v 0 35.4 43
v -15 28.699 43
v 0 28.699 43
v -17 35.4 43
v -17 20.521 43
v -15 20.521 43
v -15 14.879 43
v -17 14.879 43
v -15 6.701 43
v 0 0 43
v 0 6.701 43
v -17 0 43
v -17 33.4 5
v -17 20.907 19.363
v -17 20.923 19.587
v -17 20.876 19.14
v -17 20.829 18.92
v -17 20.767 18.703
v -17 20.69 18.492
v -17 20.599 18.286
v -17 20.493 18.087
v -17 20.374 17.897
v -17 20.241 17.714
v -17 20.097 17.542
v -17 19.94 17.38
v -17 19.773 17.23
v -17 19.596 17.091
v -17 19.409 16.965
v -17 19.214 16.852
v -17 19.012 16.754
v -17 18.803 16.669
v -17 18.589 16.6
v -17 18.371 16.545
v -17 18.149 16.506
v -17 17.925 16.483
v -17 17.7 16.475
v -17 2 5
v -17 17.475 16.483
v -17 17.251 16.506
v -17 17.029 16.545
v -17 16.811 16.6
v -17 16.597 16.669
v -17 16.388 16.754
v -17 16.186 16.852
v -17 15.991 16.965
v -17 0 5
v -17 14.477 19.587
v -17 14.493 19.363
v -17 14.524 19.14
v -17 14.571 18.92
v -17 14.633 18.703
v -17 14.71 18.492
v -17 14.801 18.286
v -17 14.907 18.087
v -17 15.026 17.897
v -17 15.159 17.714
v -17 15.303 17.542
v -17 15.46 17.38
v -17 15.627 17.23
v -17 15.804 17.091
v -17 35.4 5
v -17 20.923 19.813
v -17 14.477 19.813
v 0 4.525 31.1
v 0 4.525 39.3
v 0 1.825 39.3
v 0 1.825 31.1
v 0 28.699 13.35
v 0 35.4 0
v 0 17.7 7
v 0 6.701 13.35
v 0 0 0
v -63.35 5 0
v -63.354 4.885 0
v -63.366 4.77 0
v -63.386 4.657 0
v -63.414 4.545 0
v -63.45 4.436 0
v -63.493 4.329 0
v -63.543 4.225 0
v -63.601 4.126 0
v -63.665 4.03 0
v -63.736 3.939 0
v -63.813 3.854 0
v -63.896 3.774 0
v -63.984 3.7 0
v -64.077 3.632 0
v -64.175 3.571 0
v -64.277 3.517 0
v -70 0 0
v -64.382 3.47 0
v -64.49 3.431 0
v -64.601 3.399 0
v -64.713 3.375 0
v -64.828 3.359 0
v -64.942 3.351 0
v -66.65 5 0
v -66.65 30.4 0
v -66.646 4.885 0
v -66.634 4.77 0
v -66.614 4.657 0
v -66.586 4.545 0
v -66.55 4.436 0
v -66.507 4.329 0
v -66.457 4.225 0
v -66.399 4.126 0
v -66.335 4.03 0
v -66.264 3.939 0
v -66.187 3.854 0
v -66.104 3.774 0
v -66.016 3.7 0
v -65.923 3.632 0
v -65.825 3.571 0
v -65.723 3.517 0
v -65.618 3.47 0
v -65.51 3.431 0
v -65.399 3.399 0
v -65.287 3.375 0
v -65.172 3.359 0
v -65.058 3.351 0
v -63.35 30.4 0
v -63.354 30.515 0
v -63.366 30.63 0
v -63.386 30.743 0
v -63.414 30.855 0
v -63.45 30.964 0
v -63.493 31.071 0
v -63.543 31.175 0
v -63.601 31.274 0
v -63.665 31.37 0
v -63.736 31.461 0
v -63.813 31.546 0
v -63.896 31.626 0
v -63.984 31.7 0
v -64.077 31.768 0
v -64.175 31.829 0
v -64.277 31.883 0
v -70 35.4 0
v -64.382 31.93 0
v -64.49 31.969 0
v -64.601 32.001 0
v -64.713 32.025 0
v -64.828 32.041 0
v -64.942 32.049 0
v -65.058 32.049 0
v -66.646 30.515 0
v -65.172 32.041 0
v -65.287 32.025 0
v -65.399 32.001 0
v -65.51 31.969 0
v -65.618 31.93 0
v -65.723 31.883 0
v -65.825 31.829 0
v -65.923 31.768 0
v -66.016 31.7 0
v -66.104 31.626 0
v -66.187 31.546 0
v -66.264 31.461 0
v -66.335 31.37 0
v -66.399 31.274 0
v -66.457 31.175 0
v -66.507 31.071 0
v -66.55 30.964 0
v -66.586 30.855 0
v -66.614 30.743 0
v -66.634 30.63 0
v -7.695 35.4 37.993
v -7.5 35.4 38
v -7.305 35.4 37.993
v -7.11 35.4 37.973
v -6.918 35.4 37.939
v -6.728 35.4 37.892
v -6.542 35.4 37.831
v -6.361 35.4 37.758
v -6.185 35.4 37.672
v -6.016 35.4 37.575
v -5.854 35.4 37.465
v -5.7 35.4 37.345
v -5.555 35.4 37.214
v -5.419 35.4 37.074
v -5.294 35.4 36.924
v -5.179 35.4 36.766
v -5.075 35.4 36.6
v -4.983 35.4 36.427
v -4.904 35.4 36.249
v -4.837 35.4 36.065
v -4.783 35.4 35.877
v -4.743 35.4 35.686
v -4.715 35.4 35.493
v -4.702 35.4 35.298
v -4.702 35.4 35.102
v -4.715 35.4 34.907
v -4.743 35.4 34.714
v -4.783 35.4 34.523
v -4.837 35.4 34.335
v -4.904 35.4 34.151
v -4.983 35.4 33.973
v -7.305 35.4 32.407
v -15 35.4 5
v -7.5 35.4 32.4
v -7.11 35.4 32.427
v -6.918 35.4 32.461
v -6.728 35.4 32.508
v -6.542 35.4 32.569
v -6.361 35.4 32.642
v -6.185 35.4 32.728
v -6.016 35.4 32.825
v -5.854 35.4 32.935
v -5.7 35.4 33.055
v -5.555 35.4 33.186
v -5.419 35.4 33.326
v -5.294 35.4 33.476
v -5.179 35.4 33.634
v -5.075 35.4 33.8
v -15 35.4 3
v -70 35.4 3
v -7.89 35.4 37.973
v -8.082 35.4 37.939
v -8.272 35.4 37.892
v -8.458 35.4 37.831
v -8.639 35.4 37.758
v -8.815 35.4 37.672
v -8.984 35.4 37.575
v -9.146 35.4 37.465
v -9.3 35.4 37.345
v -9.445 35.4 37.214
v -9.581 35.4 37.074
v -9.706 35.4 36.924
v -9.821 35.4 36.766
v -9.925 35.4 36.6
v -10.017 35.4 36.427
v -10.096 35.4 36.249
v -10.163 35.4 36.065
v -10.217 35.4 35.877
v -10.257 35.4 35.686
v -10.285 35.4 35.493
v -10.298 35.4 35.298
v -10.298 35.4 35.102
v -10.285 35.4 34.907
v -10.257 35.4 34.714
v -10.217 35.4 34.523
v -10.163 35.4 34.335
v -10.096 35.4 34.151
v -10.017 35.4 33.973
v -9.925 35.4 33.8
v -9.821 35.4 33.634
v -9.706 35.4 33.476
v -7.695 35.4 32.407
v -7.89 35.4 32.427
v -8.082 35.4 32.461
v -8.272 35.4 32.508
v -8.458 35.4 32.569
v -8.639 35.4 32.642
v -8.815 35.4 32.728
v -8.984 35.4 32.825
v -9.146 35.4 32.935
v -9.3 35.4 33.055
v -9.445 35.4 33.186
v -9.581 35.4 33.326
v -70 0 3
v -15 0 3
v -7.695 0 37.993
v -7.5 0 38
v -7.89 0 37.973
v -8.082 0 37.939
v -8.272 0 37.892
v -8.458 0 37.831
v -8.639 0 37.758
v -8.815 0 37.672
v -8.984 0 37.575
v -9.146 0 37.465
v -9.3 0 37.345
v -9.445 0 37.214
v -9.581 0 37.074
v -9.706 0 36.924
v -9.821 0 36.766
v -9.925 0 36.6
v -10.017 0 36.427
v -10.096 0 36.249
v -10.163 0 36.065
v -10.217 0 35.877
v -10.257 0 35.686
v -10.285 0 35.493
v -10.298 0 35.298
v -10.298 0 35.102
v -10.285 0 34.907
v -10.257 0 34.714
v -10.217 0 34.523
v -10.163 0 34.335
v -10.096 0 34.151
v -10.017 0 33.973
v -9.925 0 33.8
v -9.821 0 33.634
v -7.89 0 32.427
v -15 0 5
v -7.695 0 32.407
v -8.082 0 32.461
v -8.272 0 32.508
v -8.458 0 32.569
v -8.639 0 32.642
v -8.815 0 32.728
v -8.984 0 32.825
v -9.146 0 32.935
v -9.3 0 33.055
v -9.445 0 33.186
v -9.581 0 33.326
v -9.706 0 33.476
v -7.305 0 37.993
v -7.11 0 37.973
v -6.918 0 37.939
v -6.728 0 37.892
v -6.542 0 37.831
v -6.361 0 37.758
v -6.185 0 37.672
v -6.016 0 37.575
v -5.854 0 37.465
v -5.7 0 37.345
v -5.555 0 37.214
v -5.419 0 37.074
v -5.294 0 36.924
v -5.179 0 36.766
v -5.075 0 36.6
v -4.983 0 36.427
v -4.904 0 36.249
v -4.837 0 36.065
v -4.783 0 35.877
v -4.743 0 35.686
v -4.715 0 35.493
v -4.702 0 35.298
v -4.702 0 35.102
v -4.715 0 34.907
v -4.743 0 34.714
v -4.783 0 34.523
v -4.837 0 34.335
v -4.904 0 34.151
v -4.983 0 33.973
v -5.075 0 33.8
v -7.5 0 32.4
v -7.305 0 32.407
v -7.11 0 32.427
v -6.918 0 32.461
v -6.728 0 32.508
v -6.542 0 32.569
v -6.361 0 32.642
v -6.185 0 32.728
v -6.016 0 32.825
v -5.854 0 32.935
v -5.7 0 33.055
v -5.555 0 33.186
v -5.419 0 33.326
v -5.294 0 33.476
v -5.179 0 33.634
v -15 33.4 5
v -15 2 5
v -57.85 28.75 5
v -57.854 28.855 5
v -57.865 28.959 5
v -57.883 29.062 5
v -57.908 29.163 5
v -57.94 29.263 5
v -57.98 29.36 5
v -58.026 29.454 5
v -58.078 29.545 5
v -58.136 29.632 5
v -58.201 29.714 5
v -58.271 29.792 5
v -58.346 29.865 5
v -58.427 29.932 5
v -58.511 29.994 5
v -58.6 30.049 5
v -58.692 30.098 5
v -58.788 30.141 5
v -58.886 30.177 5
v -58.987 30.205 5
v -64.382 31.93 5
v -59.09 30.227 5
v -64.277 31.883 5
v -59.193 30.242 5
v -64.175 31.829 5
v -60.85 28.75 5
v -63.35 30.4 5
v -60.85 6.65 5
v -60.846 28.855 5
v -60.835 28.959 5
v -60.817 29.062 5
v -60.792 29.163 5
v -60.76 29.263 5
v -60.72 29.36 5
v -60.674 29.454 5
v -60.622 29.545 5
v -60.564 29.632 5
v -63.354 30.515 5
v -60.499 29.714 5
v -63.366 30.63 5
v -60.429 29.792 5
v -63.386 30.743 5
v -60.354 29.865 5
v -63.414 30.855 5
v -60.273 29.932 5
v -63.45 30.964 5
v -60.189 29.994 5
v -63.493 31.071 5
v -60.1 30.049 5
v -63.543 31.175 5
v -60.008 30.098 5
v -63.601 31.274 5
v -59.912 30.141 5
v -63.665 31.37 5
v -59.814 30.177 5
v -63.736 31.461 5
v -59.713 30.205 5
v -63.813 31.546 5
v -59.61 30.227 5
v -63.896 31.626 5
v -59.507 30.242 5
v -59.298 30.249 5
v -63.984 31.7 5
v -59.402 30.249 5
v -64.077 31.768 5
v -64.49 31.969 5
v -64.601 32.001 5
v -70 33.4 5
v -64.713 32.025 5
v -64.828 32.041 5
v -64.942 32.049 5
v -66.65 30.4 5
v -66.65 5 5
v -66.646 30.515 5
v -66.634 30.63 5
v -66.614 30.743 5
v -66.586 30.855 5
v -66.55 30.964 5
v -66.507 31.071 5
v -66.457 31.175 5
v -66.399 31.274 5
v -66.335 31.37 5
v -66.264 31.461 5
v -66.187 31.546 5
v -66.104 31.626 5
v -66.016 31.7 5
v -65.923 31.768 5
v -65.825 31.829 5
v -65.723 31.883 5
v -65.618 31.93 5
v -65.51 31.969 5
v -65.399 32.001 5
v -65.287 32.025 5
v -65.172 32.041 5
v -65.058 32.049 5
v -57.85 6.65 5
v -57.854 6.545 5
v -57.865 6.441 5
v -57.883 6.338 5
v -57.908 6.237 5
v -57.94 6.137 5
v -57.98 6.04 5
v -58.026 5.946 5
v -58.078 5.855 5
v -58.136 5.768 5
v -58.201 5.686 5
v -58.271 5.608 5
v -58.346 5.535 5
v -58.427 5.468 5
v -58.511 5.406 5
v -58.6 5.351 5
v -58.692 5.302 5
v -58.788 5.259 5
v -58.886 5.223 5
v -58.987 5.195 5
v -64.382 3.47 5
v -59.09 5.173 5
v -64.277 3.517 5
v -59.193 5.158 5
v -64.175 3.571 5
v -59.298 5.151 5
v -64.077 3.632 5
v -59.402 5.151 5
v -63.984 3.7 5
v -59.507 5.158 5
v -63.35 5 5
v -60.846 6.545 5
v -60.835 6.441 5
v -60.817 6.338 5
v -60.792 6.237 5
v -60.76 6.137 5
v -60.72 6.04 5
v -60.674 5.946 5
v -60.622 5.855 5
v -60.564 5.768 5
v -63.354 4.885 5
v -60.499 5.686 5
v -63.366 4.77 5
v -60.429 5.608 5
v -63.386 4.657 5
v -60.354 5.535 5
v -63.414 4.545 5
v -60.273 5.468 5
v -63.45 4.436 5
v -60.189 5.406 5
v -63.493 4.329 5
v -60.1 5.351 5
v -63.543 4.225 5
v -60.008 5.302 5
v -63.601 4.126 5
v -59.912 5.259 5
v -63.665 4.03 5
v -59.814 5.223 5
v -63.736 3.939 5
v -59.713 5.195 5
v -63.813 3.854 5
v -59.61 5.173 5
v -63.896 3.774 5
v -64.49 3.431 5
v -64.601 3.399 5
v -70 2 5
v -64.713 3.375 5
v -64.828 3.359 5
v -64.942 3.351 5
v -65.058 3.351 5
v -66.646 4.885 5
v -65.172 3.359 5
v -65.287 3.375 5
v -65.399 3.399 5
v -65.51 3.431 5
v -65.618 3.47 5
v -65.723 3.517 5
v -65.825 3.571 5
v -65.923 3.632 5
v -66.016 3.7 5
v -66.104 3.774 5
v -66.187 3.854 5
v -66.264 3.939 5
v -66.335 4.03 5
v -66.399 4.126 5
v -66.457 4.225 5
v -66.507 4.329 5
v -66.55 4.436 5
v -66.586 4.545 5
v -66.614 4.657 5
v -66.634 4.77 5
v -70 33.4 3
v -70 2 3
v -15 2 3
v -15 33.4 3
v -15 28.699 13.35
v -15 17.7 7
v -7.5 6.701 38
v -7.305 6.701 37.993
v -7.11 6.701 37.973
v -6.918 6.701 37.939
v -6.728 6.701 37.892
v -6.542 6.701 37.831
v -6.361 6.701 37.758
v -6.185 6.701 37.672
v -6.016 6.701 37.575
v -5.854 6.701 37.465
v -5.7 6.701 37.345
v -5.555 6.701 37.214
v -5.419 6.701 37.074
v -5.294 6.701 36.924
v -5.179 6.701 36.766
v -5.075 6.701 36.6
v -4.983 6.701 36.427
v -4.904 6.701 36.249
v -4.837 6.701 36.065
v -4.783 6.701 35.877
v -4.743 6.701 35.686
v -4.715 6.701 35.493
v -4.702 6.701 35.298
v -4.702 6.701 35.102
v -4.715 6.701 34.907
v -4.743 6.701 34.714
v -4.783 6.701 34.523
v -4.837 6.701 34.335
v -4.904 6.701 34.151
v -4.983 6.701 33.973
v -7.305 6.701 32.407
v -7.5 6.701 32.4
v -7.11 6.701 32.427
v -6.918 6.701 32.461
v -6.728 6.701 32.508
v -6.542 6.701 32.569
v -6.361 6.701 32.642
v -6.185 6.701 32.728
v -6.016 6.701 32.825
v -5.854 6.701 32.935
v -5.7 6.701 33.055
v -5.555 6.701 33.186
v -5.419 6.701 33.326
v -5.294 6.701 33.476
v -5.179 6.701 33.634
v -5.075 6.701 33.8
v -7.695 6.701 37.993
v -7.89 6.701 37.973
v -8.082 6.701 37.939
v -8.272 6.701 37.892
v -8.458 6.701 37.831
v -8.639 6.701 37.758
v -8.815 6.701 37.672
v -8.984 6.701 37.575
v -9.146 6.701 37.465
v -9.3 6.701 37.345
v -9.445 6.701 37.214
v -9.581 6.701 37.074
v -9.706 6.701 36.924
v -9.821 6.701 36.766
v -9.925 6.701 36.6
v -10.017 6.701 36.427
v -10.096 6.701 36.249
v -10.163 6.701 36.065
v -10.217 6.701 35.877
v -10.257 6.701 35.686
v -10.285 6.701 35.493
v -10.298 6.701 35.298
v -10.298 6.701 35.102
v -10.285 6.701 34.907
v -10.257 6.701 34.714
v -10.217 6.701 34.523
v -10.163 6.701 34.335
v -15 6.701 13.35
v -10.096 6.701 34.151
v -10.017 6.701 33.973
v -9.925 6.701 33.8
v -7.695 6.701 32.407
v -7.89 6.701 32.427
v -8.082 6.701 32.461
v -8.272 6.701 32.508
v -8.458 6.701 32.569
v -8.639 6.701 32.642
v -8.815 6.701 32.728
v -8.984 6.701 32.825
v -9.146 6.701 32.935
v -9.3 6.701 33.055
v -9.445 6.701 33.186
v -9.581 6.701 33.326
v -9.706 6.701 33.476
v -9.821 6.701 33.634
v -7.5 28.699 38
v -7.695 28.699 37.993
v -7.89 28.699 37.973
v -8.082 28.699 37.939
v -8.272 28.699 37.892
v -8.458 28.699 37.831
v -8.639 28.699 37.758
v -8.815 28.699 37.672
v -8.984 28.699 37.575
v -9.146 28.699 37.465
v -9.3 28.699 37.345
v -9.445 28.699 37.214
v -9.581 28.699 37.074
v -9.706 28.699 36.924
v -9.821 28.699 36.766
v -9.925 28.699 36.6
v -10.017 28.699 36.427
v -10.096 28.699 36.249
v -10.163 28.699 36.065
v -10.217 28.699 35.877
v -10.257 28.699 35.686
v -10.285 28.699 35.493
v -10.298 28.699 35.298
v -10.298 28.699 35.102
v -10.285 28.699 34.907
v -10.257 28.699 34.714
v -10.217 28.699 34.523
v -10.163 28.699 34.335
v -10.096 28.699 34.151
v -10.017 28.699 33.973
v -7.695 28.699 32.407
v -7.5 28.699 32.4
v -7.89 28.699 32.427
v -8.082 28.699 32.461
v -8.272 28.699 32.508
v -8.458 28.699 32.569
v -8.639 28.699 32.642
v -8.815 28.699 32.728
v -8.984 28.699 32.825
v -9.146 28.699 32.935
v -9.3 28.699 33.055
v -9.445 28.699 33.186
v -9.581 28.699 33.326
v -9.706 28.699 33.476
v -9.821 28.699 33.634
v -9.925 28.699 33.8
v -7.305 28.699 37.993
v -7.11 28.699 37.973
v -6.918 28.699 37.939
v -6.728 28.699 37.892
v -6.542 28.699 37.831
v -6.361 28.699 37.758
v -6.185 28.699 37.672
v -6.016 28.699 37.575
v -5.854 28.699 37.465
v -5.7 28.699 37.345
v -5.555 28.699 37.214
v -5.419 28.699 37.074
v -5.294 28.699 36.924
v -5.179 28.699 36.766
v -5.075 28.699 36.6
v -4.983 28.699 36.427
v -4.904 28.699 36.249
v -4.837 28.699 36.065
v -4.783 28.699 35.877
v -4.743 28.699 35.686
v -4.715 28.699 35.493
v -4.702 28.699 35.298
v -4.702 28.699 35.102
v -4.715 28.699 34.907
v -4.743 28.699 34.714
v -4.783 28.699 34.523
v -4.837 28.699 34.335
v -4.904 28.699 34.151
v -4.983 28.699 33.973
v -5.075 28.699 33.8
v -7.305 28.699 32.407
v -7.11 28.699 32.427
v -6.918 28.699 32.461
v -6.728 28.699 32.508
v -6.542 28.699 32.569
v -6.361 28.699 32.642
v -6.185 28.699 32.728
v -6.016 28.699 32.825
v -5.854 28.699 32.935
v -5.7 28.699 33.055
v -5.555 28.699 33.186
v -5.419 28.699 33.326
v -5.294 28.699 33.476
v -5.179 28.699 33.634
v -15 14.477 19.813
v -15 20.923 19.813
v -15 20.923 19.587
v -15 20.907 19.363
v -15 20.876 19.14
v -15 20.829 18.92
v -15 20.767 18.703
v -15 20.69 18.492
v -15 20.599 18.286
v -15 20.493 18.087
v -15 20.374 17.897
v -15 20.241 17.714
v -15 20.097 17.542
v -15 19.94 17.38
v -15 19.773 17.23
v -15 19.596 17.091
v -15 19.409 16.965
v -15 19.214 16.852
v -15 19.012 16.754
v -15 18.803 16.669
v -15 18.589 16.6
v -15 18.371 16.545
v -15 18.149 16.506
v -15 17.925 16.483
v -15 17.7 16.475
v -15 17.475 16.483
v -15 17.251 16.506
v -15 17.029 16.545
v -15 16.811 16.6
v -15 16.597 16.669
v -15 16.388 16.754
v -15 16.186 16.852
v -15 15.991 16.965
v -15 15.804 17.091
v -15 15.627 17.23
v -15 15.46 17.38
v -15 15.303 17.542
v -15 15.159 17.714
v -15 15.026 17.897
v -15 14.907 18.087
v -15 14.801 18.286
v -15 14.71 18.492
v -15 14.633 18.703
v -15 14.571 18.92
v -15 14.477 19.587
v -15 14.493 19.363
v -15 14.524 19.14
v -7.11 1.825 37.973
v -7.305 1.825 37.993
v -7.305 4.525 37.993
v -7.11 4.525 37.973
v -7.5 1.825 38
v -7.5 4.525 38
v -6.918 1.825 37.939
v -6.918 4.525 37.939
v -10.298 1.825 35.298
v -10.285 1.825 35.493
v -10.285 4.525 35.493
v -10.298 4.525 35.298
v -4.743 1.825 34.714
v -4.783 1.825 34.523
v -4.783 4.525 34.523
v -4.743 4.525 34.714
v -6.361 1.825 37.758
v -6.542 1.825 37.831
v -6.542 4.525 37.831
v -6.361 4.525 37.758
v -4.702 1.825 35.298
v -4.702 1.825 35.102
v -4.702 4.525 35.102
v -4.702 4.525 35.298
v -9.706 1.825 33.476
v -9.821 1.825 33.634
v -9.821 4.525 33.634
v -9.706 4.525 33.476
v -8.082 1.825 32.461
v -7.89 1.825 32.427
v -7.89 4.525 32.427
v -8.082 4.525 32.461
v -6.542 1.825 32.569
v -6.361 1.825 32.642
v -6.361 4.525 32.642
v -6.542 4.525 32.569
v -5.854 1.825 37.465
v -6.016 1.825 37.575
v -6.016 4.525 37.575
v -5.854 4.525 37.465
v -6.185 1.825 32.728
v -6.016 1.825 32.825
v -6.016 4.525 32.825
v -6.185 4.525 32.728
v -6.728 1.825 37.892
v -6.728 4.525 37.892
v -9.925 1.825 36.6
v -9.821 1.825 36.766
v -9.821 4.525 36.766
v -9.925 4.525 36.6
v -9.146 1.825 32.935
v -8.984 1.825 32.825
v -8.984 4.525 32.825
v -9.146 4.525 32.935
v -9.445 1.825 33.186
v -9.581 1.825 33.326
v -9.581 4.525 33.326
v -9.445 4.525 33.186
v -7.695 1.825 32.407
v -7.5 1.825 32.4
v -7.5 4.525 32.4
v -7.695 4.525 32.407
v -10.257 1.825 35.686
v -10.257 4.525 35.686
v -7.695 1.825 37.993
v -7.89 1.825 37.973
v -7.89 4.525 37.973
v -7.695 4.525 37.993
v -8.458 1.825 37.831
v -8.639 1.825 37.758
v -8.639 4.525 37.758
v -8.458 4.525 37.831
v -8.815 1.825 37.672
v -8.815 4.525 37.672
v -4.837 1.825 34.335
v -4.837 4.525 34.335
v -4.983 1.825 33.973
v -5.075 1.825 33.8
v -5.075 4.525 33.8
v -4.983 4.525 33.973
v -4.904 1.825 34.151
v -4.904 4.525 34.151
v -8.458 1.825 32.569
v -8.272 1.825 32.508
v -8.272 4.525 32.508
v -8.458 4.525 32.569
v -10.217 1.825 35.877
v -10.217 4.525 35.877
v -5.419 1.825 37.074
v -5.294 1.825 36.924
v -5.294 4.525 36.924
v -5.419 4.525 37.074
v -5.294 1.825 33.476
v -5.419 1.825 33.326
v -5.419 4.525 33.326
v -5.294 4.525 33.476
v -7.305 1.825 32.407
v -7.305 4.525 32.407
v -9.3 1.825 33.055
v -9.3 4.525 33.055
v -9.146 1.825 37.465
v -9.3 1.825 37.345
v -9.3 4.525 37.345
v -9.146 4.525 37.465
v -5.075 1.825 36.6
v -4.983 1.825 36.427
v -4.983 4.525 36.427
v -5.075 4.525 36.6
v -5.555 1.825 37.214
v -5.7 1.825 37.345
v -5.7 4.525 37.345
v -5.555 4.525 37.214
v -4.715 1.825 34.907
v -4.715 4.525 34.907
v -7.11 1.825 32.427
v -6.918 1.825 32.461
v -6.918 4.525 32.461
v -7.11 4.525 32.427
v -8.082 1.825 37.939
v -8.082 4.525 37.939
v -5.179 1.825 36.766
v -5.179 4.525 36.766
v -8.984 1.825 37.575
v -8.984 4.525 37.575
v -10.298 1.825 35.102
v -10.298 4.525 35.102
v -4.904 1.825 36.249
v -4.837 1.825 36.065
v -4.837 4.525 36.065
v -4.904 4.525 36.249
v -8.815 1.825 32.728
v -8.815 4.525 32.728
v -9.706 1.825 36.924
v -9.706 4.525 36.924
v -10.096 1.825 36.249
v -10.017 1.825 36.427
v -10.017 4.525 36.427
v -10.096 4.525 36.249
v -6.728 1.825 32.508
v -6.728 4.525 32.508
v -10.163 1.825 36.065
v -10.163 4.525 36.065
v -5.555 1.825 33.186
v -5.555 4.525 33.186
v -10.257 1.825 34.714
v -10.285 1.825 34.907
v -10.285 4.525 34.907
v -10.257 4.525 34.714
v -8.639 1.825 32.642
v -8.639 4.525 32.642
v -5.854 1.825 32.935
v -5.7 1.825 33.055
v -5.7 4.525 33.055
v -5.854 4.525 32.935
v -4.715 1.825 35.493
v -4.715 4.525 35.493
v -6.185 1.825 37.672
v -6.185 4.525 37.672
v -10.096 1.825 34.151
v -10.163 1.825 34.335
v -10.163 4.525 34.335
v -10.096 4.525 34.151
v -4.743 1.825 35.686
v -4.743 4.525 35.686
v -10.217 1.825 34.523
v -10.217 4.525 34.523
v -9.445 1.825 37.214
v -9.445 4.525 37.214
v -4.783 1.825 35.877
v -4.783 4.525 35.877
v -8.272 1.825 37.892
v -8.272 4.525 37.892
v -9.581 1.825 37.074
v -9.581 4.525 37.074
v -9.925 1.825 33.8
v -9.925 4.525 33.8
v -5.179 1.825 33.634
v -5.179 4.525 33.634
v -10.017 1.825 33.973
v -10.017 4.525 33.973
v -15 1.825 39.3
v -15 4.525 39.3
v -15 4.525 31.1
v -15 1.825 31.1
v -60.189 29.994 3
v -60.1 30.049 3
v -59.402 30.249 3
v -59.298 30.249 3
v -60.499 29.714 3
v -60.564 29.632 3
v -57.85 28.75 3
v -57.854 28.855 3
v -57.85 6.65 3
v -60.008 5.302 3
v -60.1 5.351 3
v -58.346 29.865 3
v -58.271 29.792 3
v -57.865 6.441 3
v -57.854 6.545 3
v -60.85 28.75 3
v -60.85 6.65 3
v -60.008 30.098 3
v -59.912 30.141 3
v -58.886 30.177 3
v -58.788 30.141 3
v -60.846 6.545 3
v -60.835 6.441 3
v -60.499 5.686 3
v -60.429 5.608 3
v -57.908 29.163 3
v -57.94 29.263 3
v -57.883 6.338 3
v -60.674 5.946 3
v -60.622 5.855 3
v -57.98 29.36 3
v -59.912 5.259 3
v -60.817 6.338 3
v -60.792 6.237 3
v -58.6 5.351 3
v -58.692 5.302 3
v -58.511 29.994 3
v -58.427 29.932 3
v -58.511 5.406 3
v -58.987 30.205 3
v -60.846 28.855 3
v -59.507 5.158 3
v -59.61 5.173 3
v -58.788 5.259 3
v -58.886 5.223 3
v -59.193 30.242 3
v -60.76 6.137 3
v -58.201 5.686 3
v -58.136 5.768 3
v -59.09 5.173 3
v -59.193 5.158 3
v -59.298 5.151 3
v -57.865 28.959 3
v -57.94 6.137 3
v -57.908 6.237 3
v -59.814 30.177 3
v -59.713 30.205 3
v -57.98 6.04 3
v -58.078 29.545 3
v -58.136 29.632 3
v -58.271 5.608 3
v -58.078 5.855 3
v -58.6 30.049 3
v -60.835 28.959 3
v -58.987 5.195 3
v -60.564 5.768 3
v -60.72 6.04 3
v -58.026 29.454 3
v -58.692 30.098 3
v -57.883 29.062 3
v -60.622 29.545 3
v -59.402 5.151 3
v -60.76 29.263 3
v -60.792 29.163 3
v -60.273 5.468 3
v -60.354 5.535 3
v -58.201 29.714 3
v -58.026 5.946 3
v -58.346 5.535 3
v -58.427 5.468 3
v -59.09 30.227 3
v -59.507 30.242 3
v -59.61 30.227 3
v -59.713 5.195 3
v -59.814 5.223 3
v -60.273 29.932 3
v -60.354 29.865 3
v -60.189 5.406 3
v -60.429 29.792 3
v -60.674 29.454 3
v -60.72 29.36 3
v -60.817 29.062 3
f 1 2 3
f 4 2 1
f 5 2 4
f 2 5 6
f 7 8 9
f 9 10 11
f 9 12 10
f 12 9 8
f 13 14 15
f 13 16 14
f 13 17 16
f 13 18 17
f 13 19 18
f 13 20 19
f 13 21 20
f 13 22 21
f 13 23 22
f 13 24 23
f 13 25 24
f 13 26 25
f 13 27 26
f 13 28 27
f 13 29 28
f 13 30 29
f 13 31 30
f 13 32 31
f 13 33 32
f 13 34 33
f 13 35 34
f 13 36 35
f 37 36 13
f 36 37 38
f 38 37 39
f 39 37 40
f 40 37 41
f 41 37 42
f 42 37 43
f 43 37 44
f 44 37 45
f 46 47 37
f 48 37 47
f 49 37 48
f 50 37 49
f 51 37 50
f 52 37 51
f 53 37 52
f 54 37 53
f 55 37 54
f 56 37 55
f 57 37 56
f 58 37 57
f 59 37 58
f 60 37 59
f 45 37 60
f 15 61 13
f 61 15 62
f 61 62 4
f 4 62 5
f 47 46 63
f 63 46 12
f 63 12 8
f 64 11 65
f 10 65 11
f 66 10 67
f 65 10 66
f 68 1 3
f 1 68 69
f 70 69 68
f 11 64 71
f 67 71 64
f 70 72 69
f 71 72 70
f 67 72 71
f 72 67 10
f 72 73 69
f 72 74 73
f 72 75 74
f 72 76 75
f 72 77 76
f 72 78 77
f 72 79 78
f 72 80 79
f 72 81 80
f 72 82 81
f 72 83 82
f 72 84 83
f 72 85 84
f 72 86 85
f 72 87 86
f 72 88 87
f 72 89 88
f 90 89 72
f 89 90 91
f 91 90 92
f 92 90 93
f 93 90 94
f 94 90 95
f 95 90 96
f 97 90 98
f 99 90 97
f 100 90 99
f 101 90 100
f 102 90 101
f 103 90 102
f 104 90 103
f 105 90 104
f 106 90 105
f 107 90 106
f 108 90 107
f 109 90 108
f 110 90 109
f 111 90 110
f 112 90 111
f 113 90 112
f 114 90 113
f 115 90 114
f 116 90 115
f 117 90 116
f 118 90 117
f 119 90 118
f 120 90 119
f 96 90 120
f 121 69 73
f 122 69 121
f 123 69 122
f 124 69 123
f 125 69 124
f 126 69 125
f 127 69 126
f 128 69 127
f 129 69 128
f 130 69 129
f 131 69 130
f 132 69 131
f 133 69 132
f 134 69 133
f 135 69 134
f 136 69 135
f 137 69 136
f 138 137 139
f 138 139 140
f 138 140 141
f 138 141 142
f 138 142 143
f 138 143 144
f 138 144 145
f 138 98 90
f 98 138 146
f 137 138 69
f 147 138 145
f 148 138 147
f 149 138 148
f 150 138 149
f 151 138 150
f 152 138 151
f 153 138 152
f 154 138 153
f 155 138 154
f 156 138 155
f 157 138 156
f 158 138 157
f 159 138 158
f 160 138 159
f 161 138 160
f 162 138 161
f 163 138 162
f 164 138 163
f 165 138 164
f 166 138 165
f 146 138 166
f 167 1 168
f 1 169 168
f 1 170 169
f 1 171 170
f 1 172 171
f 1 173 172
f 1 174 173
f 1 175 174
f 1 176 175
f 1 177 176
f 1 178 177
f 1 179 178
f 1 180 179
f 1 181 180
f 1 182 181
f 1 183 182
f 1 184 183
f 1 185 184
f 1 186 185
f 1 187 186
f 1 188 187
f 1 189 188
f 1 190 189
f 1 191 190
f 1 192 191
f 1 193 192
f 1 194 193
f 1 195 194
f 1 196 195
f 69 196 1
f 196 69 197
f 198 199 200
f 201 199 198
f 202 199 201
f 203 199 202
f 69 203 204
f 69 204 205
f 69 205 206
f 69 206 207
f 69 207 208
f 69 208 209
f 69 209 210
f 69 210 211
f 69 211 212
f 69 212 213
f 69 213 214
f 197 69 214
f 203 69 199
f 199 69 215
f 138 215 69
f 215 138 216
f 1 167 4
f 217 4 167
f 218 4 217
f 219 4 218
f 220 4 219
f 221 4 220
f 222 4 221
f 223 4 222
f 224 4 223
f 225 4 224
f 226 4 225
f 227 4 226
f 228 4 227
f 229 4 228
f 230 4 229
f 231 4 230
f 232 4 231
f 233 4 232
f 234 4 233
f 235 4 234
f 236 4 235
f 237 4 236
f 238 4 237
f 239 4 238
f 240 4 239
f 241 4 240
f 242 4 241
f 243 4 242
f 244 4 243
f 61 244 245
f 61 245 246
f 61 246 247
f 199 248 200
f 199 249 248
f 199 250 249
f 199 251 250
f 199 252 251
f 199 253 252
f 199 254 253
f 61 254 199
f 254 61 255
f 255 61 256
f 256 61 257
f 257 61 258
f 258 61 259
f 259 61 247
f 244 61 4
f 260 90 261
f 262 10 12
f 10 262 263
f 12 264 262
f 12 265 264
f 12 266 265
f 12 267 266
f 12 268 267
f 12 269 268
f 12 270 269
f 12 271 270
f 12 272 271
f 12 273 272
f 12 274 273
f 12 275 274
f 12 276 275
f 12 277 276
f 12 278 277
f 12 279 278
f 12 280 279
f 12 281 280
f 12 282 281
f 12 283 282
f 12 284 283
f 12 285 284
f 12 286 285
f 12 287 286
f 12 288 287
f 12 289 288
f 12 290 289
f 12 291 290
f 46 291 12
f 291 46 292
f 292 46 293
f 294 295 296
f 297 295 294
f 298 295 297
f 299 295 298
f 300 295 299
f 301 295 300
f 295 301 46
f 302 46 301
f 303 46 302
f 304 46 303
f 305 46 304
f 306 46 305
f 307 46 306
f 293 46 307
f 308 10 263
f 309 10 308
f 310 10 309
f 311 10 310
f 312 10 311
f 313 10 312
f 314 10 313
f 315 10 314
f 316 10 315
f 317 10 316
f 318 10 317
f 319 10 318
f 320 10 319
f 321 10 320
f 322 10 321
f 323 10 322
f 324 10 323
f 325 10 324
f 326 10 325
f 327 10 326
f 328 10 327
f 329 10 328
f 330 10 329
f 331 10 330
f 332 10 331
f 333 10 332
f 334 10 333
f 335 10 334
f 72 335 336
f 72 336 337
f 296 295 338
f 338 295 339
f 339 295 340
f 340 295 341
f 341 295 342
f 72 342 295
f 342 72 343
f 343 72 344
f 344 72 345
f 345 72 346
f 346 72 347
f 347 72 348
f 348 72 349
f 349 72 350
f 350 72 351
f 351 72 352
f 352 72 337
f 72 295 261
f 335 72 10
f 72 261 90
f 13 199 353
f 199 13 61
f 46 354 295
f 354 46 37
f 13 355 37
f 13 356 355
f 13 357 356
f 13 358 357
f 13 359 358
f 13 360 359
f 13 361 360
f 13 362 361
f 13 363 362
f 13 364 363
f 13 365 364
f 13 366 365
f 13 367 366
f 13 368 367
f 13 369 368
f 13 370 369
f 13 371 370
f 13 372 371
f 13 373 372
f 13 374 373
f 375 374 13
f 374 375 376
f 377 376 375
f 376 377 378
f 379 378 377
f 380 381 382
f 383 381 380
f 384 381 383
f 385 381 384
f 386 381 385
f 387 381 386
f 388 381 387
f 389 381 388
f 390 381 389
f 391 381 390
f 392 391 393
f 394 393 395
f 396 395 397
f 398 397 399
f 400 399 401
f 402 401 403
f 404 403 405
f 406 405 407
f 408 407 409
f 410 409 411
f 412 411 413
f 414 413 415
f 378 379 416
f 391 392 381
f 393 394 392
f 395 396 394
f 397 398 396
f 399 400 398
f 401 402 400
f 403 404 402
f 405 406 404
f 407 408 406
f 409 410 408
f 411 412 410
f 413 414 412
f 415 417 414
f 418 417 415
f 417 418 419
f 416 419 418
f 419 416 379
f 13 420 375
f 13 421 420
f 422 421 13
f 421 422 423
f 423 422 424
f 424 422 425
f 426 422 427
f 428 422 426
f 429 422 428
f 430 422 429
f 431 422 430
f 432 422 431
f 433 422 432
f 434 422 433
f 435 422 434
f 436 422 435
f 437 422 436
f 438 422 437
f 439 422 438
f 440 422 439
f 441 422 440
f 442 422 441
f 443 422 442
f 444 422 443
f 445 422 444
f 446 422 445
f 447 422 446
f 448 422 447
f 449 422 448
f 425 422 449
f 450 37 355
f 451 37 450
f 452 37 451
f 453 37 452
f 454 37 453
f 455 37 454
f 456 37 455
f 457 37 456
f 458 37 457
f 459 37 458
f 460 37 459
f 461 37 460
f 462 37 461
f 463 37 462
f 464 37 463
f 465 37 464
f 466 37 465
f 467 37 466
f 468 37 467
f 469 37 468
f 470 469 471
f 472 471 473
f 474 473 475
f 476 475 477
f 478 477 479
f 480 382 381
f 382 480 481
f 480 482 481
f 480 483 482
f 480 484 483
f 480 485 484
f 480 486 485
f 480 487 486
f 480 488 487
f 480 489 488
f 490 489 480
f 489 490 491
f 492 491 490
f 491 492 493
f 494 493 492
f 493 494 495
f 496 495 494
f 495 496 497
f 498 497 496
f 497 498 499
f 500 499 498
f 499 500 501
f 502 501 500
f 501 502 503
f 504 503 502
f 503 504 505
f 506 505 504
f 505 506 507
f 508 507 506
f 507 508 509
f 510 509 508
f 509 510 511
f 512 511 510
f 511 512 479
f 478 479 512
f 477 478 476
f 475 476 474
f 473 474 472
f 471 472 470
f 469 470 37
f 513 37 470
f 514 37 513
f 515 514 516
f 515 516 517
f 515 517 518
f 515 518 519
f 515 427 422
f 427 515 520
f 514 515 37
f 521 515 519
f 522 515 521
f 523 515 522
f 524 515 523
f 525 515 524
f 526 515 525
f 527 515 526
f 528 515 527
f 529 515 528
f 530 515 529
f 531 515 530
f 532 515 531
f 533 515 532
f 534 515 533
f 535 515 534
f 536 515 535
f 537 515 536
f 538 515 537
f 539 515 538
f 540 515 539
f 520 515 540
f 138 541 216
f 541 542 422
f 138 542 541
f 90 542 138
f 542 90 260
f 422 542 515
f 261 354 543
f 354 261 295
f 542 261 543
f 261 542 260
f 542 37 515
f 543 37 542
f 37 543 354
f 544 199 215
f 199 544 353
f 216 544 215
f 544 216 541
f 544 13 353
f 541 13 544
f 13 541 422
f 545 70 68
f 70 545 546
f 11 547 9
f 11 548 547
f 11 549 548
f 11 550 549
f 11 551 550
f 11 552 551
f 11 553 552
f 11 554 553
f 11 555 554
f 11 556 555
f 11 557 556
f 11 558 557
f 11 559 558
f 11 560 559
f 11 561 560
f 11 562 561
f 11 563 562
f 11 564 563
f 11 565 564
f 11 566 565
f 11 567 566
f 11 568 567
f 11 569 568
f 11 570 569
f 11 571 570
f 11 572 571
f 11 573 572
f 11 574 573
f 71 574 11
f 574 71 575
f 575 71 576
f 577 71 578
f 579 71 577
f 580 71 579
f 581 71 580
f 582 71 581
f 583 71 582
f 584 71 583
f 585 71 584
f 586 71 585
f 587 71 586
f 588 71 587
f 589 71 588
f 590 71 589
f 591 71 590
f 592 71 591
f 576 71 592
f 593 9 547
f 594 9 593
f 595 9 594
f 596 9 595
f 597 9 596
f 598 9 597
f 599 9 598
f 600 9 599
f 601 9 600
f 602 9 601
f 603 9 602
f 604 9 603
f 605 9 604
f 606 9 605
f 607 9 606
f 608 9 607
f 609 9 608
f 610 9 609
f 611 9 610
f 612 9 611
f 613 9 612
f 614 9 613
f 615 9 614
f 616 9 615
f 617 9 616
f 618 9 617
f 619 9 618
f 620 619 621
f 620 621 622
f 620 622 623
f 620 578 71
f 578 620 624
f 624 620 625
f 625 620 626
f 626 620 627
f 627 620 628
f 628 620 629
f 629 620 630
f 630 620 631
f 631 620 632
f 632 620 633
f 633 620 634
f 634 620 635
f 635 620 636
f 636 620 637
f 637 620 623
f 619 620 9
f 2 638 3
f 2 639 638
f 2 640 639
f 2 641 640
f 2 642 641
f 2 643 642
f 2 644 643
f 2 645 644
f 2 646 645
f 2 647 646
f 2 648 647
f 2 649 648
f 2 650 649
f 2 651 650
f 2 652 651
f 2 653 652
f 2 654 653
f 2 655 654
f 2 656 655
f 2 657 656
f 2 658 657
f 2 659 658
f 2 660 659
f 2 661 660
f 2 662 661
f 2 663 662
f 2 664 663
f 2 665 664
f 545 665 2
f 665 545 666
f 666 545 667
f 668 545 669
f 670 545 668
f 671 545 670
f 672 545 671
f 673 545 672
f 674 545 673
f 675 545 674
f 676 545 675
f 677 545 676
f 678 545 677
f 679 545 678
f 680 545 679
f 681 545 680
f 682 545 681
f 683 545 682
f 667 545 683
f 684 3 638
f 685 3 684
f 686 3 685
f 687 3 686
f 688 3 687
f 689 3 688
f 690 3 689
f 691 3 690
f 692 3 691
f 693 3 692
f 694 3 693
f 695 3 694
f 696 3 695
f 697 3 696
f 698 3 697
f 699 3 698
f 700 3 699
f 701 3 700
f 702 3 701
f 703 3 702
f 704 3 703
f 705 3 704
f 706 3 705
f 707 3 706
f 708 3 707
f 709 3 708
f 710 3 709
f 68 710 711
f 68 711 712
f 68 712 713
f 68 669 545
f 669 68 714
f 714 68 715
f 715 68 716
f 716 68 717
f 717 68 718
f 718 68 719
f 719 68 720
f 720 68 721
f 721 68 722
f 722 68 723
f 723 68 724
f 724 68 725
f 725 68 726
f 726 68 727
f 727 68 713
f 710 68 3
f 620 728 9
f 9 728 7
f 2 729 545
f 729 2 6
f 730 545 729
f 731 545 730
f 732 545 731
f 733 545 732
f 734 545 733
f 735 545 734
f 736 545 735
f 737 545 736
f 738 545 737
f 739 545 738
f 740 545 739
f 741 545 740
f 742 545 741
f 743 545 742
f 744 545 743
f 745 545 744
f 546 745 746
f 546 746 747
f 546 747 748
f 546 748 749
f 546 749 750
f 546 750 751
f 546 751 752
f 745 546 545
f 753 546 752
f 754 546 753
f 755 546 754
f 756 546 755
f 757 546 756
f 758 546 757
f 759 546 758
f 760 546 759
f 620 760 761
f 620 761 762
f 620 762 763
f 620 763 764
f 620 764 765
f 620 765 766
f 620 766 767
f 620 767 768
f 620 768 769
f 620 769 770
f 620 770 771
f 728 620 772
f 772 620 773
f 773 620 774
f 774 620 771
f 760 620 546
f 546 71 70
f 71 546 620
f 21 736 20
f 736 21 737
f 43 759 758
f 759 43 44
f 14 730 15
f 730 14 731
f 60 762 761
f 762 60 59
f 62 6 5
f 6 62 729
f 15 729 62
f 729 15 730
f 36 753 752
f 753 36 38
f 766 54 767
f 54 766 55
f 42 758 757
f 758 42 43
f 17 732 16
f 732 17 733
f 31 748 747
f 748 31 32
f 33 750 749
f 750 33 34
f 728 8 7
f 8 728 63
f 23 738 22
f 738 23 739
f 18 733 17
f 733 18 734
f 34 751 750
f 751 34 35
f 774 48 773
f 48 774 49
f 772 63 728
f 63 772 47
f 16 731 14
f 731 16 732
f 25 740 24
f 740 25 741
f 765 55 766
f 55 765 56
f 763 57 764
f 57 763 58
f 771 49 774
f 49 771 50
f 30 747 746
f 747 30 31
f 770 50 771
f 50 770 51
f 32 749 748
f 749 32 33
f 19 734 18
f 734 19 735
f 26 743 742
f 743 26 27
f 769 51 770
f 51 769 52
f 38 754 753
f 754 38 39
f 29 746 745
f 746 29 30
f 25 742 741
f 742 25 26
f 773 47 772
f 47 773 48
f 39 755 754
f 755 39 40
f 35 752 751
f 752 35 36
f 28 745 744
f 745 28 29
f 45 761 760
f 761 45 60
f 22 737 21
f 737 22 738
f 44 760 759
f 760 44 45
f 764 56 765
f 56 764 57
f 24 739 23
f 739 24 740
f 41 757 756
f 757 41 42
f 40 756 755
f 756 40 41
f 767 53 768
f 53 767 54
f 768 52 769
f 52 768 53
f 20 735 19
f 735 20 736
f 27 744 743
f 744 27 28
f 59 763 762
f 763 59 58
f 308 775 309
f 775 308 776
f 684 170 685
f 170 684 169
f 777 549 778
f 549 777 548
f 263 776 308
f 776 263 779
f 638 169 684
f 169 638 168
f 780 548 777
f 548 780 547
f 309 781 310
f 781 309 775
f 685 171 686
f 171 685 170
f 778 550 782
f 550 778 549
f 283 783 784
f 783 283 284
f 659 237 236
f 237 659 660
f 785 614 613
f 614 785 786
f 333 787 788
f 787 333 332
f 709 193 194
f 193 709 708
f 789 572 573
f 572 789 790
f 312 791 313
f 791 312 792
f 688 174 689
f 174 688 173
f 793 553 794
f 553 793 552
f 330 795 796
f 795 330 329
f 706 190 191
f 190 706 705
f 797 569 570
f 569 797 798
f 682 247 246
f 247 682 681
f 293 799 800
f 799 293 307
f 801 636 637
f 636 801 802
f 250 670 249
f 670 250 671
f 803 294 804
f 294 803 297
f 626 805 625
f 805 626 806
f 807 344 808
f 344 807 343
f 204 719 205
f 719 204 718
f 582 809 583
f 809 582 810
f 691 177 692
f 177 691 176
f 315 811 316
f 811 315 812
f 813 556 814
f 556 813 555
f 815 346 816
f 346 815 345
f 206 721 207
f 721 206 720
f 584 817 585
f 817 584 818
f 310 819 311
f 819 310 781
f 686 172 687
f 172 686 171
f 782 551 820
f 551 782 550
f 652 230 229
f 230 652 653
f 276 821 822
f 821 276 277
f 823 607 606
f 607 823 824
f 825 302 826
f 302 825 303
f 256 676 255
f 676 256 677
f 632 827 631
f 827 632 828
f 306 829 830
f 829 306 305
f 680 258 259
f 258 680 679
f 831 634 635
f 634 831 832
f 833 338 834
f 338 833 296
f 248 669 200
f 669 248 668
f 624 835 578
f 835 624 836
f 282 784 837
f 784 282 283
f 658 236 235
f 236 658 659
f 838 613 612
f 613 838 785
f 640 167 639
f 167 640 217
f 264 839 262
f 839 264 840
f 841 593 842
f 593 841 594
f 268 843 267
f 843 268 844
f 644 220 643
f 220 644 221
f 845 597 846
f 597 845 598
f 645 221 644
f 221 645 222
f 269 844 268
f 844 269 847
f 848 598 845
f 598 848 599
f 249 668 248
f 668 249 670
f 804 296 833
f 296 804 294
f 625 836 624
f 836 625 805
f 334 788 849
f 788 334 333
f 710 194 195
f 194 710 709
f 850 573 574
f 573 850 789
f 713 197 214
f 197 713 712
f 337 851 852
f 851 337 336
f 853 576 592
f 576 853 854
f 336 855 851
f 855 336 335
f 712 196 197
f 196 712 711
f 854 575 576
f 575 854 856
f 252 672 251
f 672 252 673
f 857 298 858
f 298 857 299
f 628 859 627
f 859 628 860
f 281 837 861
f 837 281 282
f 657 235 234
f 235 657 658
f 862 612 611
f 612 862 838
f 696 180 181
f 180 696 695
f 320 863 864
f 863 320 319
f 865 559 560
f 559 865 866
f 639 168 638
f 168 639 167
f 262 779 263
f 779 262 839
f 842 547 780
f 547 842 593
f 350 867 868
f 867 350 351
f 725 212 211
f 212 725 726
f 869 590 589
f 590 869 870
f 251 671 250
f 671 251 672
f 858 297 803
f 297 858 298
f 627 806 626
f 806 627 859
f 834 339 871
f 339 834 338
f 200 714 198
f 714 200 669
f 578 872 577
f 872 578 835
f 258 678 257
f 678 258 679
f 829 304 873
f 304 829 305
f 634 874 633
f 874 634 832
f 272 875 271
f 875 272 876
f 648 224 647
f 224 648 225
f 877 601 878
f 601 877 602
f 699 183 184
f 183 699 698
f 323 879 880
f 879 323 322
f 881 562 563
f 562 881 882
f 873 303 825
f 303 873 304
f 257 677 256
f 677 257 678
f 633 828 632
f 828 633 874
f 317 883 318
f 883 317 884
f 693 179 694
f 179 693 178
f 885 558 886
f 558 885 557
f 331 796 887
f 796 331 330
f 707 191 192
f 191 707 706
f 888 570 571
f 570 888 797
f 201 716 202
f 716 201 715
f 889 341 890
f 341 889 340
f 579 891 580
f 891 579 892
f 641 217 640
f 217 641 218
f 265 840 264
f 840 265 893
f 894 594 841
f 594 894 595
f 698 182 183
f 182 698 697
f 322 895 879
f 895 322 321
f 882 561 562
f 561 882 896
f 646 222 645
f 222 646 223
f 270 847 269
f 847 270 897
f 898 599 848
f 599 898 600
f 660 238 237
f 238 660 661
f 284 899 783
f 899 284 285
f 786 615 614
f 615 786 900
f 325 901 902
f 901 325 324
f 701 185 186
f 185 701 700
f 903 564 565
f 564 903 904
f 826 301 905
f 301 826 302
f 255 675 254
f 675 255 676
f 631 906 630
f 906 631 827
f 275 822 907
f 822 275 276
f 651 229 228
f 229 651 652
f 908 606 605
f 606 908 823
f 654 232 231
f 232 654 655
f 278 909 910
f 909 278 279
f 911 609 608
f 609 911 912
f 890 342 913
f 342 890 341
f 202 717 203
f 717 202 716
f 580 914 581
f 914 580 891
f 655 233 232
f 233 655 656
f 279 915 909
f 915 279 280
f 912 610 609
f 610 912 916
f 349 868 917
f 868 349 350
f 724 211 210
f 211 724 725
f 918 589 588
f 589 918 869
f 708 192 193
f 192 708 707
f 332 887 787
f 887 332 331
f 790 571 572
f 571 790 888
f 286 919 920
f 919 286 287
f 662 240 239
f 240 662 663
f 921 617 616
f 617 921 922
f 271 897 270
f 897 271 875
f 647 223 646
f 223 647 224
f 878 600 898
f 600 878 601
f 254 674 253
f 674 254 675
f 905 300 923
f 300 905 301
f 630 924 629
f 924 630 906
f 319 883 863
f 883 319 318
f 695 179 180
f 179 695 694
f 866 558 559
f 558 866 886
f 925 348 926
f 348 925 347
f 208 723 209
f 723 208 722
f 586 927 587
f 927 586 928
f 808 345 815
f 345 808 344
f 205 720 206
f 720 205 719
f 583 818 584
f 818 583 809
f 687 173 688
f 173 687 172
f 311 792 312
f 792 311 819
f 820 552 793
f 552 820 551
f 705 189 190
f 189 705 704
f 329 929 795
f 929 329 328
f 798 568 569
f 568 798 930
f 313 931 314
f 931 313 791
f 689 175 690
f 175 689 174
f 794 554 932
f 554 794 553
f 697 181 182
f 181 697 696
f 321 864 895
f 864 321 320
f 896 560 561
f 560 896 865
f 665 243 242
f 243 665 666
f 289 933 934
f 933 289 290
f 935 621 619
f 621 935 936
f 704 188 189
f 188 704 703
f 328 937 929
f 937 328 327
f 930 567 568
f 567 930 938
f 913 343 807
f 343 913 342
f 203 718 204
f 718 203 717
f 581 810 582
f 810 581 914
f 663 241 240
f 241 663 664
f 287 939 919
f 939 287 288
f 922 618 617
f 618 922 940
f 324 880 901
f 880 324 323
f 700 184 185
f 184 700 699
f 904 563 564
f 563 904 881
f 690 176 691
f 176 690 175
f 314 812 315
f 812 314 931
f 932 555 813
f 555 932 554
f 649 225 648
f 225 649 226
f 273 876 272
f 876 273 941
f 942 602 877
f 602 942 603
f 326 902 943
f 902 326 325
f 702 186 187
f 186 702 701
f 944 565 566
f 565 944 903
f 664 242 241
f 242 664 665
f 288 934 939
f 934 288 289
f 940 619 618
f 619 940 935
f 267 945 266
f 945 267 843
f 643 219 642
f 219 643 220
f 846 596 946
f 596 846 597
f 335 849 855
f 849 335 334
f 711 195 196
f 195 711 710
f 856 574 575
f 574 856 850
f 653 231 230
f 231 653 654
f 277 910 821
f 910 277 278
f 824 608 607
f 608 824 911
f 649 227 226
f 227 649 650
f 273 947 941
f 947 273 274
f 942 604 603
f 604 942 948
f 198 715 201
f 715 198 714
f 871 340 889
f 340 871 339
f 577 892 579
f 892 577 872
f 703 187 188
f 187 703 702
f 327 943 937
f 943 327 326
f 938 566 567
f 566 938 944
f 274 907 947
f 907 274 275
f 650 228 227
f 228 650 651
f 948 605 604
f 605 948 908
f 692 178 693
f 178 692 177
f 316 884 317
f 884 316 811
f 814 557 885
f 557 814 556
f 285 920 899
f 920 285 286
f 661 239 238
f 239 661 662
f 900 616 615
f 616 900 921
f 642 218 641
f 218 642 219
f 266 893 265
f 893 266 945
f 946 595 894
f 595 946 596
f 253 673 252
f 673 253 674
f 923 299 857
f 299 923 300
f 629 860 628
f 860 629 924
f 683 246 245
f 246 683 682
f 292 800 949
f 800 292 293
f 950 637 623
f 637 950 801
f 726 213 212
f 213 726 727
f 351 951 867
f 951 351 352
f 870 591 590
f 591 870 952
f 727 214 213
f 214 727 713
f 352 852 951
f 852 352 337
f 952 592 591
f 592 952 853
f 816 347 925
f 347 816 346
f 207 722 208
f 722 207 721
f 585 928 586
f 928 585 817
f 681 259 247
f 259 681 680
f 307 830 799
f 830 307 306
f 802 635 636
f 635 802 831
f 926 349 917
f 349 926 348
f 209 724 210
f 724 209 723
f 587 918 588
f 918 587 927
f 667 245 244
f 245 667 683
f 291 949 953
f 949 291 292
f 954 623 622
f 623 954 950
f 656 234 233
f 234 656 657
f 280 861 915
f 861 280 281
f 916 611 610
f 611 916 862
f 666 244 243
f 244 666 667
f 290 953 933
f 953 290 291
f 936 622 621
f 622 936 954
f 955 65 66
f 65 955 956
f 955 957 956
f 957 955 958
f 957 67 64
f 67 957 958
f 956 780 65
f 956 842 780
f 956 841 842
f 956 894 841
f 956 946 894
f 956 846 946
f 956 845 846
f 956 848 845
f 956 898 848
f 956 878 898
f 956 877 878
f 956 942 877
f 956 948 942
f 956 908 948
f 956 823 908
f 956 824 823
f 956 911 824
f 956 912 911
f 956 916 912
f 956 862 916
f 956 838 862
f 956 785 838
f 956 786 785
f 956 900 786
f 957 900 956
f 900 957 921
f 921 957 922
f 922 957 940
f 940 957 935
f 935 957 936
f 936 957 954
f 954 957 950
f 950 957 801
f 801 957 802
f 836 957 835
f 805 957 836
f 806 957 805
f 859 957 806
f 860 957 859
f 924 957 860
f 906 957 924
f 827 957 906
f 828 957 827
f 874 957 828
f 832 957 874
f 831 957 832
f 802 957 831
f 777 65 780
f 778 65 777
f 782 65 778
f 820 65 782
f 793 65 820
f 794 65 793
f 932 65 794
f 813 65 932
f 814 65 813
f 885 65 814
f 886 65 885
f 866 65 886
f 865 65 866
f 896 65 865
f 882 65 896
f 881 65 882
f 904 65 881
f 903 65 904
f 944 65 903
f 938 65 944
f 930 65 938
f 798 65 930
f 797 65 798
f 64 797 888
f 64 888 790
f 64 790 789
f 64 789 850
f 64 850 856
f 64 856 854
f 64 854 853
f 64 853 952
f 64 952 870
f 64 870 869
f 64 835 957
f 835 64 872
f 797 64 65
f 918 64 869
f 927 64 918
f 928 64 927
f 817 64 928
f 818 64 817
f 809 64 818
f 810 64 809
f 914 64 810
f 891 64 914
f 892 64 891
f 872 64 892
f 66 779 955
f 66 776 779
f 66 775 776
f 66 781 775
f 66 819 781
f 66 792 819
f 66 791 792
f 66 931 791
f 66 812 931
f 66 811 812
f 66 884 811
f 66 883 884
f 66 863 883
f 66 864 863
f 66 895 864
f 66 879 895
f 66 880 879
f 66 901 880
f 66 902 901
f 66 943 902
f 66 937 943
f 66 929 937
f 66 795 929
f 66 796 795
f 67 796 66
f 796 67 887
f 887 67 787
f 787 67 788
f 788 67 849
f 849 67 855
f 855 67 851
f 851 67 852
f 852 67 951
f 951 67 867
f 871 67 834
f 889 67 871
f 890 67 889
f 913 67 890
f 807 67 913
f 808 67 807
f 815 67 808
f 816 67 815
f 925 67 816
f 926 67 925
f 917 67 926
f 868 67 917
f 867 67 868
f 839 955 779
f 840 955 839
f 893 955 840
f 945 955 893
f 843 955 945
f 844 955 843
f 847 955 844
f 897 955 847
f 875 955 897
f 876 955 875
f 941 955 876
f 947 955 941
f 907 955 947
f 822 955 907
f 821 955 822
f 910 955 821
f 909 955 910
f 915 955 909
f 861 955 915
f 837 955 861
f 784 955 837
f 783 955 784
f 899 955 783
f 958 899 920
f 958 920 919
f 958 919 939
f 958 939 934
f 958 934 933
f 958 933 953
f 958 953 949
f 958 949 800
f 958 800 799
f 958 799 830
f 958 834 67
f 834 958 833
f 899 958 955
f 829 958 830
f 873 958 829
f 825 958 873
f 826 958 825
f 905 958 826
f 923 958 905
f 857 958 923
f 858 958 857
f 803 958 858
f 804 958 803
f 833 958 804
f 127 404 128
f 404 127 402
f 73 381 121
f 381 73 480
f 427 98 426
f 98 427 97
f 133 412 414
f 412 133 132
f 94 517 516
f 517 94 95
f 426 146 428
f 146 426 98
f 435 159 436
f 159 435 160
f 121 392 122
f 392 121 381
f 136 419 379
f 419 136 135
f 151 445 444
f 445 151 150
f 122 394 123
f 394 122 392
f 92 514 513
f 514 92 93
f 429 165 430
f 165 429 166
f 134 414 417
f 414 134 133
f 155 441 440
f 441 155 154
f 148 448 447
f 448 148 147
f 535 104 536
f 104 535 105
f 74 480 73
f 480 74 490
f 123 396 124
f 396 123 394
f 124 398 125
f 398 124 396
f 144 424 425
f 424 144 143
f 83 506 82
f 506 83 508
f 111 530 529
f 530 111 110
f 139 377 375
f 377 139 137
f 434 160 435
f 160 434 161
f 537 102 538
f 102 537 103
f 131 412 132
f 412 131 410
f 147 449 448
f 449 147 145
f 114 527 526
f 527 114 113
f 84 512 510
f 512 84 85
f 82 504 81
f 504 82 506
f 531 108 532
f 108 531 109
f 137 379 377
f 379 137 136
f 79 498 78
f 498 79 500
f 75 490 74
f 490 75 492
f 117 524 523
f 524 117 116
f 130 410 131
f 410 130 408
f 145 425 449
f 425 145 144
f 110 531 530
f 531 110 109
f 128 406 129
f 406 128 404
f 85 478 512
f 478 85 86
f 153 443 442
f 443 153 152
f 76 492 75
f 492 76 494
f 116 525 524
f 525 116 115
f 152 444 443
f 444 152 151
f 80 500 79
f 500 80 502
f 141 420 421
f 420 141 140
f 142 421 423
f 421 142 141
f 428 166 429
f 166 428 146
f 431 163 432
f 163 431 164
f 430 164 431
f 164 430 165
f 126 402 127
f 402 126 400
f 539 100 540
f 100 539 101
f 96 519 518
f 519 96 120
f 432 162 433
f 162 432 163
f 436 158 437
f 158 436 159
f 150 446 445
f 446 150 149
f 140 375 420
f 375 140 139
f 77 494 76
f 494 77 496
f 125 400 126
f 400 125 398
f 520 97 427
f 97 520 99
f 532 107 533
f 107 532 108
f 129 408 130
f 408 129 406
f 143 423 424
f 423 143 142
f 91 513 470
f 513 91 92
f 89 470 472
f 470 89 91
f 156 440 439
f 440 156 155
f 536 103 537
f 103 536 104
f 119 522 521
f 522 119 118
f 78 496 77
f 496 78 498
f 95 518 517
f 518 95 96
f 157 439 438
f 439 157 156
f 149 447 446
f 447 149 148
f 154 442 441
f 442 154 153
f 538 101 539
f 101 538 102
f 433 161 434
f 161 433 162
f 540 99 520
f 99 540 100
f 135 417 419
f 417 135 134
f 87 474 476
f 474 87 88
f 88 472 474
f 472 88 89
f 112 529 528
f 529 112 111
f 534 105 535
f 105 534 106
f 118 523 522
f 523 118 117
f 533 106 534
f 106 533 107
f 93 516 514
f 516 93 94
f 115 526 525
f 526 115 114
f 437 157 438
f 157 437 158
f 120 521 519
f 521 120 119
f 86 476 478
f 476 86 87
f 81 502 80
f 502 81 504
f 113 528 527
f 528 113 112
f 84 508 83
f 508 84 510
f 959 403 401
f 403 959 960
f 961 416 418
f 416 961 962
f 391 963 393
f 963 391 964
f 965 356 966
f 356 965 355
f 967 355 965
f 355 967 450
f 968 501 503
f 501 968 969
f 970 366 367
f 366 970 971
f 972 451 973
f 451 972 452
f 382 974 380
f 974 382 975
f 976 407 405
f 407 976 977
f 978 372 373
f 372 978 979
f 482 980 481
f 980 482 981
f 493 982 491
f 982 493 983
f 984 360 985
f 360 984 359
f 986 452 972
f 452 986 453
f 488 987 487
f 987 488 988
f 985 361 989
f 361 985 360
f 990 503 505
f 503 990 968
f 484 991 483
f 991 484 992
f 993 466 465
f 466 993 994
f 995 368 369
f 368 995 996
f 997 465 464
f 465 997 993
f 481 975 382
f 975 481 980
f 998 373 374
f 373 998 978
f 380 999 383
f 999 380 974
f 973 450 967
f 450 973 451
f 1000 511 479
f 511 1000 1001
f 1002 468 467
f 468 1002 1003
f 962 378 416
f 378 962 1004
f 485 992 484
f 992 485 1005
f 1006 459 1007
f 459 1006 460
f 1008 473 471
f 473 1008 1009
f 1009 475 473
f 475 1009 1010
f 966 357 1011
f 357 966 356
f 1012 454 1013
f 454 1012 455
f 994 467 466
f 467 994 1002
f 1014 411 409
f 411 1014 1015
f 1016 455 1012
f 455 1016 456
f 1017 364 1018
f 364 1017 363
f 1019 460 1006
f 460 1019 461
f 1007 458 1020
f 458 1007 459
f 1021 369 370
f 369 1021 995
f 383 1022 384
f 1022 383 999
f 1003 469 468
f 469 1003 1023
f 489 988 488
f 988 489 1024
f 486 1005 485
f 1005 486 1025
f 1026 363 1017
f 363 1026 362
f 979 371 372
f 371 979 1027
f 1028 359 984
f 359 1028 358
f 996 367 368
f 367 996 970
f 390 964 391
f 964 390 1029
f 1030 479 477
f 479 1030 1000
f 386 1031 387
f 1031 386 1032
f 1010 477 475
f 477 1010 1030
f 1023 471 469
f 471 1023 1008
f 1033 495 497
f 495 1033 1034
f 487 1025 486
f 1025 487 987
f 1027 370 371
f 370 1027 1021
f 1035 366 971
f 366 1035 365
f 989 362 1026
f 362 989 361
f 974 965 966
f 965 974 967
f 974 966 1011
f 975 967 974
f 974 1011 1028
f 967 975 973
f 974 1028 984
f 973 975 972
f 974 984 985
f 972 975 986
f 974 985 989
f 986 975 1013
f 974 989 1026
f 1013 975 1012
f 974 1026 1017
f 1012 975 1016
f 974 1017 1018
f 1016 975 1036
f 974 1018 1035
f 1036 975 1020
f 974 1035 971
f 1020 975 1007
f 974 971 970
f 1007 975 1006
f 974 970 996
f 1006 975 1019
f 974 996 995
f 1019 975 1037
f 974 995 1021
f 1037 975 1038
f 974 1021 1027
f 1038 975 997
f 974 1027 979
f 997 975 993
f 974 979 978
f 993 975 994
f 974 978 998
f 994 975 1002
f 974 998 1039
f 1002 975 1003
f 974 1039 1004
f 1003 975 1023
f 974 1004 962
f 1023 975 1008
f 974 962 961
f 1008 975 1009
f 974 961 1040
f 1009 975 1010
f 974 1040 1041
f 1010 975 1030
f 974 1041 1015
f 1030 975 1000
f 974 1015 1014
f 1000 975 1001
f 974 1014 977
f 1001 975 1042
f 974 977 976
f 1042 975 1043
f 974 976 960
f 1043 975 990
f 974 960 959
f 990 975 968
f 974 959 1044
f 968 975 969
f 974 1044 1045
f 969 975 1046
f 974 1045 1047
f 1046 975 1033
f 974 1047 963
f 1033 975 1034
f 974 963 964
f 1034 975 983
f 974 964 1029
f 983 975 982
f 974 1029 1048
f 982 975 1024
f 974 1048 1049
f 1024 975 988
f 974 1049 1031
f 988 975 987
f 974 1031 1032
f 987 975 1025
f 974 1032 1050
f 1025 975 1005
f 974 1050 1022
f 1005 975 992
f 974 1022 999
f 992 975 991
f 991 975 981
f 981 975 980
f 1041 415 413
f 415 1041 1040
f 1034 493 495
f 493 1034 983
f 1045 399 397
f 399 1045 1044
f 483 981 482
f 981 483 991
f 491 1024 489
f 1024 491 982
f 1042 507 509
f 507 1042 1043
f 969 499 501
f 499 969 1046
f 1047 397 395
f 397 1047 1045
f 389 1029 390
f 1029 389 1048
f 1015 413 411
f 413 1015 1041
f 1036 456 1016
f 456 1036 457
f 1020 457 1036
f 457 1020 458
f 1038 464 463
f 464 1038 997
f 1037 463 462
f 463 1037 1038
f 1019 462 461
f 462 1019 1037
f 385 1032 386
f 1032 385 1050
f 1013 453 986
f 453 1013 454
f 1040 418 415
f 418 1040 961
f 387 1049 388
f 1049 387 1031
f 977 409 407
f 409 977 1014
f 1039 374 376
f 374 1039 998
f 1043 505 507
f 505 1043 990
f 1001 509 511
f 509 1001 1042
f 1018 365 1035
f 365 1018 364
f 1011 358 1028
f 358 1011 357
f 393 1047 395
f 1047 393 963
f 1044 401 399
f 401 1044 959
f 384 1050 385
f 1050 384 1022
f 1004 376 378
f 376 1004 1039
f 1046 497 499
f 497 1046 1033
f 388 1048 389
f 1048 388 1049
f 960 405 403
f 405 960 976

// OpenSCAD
height = 70;
spindlePortionHeight = 15;
coletteHolderClearance = 2;//6;
spindleShaftDiameter = 25.4;//14.5;
holeSpacing = 19;
insetDepth = 2;
insetHeight = 3;
insetOffsetFromHoles = 4;
separation = 1;
m3 = 3.3;
m3NutWidth = 5.7;
m3nutHeight = 2;
wallThickness = 5;
sideCutoff = 3;

m5 = 5.6;
m5NutWidth = 8.2;
m5NutHeight = 2.7;

probeOffset = 5;

sides = 6;
lipHeight = 2;
lipMinDiameter = 25.4/4 +0.1;

length = 2*wallThickness+max(holeSpacing,spindleShaftDiameter);
rotate([0,-90,0])
difference() {
    union() {
        cube([wallThickness+coletteHolderClearance+spindleShaftDiameter+wallThickness+m5, length,spindlePortionHeight+lipHeight]);
        cube([wallThickness, length,height]);
    }
    hull() {
        translate([wallThickness+coletteHolderClearance+spindleShaftDiameter/2,length/2,0])
            cylinder(r=spindleShaftDiameter/2, h=spindlePortionHeight, $fn=sides);
        translate([wallThickness+coletteHolderClearance+spindleShaftDiameter+wallThickness+m5,length/2,0])
            cylinder(r=spindleShaftDiameter/2, h=spindlePortionHeight, $fn=sides);
    }
    hull() {
        translate([wallThickness+coletteHolderClearance+spindleShaftDiameter/2,length/2,0])
            cylinder(r=lipMinDiameter/2, h=spindlePortionHeight+lipHeight, $fn=90);
        translate([wallThickness+coletteHolderClearance+spindleShaftDiameter+wallThickness+m5,length/2,0])
            cylinder(r=lipMinDiameter/2, h=spindlePortionHeight+lipHeight, $fn=sides);
    }
    translate([wallThickness+coletteHolderClearance+spindleShaftDiameter+m5/2,0,spindlePortionHeight/2]) rotate([-90,0,0]) {
        cylinder(r=m5/2,h=length,$fn=90);
    }
    translate([wallThickness+coletteHolderClearance+spindleShaftDiameter+m5/2-m5NutWidth/2,(length-spindleShaftDiameter)/4-m5NutHeight/4,0])
        cube([m5NutWidth,m5NutHeight,spindlePortionHeight]);
    hull() {
        translate([0,wallThickness,height-probeOffset]) rotate([0,90,0])
            cylinder(r=m3/2,h=length,$fn=90);
        translate([0,length-wallThickness,height-probeOffset]) rotate([0,90,0])
            cylinder(r=m3/2,h=length,$fn=90);
    }
    hull() {
        translate([wallThickness-insetDepth,wallThickness+m3/2,height-probeOffset-insetOffsetFromHoles-m3/2]) rotate([0,90,0])
            cylinder(r=insetHeight/2,h=insetDepth,$fn=90);
        translate([wallThickness-insetDepth,length-wallThickness-m3/2,height-probeOffset-insetOffsetFromHoles-m3/2]) rotate([0,90,0])
            cylinder(r=insetHeight/2,h=insetDepth,$fn=90);
    }
    
    translate([wallThickness-insetDepth,0,spindlePortionHeight]) {
        cube([insetDepth, wallThickness-sideCutoff,height]);
        translate([0,length-wallThickness+sideCutoff,0])
            cube([insetDepth, wallThickness-sideCutoff,height]);
    }
}
